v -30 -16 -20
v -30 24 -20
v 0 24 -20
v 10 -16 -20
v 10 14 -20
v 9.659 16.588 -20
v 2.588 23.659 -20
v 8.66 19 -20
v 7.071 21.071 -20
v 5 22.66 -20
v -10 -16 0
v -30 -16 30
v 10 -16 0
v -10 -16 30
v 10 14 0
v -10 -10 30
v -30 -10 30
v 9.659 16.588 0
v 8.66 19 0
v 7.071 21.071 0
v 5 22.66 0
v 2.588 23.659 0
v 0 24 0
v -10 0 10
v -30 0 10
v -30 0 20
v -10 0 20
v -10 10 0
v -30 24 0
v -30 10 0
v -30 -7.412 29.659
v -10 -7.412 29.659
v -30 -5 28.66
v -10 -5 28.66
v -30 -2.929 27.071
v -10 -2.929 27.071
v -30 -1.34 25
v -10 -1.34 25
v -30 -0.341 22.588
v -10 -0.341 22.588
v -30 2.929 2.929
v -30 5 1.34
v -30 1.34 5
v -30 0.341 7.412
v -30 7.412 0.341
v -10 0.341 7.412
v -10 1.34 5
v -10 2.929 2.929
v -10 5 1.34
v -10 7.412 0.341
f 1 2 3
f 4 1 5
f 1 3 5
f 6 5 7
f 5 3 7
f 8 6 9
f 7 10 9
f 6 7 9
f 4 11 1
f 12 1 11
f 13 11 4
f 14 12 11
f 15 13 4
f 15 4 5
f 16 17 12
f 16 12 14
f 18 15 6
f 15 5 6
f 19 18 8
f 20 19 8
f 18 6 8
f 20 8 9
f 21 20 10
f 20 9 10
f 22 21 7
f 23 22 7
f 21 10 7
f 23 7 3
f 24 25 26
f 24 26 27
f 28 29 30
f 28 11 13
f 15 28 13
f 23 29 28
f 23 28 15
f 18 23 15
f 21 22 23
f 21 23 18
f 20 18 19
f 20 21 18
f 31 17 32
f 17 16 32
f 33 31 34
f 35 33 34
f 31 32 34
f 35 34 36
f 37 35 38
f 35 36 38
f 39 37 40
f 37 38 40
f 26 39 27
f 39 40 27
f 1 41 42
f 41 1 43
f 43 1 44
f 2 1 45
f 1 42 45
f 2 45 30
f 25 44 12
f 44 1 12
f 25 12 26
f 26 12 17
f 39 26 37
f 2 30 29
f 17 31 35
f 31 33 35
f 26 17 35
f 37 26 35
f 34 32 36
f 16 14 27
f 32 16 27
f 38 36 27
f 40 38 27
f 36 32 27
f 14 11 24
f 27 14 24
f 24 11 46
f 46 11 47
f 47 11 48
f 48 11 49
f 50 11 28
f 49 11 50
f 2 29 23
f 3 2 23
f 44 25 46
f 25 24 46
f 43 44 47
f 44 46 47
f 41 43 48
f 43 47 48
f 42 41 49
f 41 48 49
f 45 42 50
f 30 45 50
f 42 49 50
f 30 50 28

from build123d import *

# Parameters (mm, degrees)
SKETCH1_W           = 20
SKETCH1_H           = 16
BOSS_EXTRUDE1_DEPTH = 30
SKETCH2_W           = 40
SKETCH2_H           = 40
BOSS_EXTRUDE2_DEPTH = 20
FILLET1_R           = 10


with BuildPart() as part:
    # Sketch1 → Boss-Extrude1 (new body)
    with BuildSketch(Plane.XY):
        with Locations((-20, -8)):
            Rectangle(SKETCH1_W, SKETCH1_H)
    extrude(amount=BOSS_EXTRUDE1_DEPTH)

    # Sketch2 → Boss-Extrude2 (add)
    with BuildSketch(Plane.XY):
        with Locations((-10, 4)):
            Rectangle(SKETCH2_W, SKETCH2_H)
    extrude(amount=-BOSS_EXTRUDE2_DEPTH)

    # Fillet1
    fillet1_edges = [part.edges().sort_by_distance(p)[0] for p in [
        (10, 24, -10),
        (-20, 0, 30),
        (-20, 0, 0),
    ]]
    fillet(fillet1_edges, radius=FILLET1_R)


solid = part.part
